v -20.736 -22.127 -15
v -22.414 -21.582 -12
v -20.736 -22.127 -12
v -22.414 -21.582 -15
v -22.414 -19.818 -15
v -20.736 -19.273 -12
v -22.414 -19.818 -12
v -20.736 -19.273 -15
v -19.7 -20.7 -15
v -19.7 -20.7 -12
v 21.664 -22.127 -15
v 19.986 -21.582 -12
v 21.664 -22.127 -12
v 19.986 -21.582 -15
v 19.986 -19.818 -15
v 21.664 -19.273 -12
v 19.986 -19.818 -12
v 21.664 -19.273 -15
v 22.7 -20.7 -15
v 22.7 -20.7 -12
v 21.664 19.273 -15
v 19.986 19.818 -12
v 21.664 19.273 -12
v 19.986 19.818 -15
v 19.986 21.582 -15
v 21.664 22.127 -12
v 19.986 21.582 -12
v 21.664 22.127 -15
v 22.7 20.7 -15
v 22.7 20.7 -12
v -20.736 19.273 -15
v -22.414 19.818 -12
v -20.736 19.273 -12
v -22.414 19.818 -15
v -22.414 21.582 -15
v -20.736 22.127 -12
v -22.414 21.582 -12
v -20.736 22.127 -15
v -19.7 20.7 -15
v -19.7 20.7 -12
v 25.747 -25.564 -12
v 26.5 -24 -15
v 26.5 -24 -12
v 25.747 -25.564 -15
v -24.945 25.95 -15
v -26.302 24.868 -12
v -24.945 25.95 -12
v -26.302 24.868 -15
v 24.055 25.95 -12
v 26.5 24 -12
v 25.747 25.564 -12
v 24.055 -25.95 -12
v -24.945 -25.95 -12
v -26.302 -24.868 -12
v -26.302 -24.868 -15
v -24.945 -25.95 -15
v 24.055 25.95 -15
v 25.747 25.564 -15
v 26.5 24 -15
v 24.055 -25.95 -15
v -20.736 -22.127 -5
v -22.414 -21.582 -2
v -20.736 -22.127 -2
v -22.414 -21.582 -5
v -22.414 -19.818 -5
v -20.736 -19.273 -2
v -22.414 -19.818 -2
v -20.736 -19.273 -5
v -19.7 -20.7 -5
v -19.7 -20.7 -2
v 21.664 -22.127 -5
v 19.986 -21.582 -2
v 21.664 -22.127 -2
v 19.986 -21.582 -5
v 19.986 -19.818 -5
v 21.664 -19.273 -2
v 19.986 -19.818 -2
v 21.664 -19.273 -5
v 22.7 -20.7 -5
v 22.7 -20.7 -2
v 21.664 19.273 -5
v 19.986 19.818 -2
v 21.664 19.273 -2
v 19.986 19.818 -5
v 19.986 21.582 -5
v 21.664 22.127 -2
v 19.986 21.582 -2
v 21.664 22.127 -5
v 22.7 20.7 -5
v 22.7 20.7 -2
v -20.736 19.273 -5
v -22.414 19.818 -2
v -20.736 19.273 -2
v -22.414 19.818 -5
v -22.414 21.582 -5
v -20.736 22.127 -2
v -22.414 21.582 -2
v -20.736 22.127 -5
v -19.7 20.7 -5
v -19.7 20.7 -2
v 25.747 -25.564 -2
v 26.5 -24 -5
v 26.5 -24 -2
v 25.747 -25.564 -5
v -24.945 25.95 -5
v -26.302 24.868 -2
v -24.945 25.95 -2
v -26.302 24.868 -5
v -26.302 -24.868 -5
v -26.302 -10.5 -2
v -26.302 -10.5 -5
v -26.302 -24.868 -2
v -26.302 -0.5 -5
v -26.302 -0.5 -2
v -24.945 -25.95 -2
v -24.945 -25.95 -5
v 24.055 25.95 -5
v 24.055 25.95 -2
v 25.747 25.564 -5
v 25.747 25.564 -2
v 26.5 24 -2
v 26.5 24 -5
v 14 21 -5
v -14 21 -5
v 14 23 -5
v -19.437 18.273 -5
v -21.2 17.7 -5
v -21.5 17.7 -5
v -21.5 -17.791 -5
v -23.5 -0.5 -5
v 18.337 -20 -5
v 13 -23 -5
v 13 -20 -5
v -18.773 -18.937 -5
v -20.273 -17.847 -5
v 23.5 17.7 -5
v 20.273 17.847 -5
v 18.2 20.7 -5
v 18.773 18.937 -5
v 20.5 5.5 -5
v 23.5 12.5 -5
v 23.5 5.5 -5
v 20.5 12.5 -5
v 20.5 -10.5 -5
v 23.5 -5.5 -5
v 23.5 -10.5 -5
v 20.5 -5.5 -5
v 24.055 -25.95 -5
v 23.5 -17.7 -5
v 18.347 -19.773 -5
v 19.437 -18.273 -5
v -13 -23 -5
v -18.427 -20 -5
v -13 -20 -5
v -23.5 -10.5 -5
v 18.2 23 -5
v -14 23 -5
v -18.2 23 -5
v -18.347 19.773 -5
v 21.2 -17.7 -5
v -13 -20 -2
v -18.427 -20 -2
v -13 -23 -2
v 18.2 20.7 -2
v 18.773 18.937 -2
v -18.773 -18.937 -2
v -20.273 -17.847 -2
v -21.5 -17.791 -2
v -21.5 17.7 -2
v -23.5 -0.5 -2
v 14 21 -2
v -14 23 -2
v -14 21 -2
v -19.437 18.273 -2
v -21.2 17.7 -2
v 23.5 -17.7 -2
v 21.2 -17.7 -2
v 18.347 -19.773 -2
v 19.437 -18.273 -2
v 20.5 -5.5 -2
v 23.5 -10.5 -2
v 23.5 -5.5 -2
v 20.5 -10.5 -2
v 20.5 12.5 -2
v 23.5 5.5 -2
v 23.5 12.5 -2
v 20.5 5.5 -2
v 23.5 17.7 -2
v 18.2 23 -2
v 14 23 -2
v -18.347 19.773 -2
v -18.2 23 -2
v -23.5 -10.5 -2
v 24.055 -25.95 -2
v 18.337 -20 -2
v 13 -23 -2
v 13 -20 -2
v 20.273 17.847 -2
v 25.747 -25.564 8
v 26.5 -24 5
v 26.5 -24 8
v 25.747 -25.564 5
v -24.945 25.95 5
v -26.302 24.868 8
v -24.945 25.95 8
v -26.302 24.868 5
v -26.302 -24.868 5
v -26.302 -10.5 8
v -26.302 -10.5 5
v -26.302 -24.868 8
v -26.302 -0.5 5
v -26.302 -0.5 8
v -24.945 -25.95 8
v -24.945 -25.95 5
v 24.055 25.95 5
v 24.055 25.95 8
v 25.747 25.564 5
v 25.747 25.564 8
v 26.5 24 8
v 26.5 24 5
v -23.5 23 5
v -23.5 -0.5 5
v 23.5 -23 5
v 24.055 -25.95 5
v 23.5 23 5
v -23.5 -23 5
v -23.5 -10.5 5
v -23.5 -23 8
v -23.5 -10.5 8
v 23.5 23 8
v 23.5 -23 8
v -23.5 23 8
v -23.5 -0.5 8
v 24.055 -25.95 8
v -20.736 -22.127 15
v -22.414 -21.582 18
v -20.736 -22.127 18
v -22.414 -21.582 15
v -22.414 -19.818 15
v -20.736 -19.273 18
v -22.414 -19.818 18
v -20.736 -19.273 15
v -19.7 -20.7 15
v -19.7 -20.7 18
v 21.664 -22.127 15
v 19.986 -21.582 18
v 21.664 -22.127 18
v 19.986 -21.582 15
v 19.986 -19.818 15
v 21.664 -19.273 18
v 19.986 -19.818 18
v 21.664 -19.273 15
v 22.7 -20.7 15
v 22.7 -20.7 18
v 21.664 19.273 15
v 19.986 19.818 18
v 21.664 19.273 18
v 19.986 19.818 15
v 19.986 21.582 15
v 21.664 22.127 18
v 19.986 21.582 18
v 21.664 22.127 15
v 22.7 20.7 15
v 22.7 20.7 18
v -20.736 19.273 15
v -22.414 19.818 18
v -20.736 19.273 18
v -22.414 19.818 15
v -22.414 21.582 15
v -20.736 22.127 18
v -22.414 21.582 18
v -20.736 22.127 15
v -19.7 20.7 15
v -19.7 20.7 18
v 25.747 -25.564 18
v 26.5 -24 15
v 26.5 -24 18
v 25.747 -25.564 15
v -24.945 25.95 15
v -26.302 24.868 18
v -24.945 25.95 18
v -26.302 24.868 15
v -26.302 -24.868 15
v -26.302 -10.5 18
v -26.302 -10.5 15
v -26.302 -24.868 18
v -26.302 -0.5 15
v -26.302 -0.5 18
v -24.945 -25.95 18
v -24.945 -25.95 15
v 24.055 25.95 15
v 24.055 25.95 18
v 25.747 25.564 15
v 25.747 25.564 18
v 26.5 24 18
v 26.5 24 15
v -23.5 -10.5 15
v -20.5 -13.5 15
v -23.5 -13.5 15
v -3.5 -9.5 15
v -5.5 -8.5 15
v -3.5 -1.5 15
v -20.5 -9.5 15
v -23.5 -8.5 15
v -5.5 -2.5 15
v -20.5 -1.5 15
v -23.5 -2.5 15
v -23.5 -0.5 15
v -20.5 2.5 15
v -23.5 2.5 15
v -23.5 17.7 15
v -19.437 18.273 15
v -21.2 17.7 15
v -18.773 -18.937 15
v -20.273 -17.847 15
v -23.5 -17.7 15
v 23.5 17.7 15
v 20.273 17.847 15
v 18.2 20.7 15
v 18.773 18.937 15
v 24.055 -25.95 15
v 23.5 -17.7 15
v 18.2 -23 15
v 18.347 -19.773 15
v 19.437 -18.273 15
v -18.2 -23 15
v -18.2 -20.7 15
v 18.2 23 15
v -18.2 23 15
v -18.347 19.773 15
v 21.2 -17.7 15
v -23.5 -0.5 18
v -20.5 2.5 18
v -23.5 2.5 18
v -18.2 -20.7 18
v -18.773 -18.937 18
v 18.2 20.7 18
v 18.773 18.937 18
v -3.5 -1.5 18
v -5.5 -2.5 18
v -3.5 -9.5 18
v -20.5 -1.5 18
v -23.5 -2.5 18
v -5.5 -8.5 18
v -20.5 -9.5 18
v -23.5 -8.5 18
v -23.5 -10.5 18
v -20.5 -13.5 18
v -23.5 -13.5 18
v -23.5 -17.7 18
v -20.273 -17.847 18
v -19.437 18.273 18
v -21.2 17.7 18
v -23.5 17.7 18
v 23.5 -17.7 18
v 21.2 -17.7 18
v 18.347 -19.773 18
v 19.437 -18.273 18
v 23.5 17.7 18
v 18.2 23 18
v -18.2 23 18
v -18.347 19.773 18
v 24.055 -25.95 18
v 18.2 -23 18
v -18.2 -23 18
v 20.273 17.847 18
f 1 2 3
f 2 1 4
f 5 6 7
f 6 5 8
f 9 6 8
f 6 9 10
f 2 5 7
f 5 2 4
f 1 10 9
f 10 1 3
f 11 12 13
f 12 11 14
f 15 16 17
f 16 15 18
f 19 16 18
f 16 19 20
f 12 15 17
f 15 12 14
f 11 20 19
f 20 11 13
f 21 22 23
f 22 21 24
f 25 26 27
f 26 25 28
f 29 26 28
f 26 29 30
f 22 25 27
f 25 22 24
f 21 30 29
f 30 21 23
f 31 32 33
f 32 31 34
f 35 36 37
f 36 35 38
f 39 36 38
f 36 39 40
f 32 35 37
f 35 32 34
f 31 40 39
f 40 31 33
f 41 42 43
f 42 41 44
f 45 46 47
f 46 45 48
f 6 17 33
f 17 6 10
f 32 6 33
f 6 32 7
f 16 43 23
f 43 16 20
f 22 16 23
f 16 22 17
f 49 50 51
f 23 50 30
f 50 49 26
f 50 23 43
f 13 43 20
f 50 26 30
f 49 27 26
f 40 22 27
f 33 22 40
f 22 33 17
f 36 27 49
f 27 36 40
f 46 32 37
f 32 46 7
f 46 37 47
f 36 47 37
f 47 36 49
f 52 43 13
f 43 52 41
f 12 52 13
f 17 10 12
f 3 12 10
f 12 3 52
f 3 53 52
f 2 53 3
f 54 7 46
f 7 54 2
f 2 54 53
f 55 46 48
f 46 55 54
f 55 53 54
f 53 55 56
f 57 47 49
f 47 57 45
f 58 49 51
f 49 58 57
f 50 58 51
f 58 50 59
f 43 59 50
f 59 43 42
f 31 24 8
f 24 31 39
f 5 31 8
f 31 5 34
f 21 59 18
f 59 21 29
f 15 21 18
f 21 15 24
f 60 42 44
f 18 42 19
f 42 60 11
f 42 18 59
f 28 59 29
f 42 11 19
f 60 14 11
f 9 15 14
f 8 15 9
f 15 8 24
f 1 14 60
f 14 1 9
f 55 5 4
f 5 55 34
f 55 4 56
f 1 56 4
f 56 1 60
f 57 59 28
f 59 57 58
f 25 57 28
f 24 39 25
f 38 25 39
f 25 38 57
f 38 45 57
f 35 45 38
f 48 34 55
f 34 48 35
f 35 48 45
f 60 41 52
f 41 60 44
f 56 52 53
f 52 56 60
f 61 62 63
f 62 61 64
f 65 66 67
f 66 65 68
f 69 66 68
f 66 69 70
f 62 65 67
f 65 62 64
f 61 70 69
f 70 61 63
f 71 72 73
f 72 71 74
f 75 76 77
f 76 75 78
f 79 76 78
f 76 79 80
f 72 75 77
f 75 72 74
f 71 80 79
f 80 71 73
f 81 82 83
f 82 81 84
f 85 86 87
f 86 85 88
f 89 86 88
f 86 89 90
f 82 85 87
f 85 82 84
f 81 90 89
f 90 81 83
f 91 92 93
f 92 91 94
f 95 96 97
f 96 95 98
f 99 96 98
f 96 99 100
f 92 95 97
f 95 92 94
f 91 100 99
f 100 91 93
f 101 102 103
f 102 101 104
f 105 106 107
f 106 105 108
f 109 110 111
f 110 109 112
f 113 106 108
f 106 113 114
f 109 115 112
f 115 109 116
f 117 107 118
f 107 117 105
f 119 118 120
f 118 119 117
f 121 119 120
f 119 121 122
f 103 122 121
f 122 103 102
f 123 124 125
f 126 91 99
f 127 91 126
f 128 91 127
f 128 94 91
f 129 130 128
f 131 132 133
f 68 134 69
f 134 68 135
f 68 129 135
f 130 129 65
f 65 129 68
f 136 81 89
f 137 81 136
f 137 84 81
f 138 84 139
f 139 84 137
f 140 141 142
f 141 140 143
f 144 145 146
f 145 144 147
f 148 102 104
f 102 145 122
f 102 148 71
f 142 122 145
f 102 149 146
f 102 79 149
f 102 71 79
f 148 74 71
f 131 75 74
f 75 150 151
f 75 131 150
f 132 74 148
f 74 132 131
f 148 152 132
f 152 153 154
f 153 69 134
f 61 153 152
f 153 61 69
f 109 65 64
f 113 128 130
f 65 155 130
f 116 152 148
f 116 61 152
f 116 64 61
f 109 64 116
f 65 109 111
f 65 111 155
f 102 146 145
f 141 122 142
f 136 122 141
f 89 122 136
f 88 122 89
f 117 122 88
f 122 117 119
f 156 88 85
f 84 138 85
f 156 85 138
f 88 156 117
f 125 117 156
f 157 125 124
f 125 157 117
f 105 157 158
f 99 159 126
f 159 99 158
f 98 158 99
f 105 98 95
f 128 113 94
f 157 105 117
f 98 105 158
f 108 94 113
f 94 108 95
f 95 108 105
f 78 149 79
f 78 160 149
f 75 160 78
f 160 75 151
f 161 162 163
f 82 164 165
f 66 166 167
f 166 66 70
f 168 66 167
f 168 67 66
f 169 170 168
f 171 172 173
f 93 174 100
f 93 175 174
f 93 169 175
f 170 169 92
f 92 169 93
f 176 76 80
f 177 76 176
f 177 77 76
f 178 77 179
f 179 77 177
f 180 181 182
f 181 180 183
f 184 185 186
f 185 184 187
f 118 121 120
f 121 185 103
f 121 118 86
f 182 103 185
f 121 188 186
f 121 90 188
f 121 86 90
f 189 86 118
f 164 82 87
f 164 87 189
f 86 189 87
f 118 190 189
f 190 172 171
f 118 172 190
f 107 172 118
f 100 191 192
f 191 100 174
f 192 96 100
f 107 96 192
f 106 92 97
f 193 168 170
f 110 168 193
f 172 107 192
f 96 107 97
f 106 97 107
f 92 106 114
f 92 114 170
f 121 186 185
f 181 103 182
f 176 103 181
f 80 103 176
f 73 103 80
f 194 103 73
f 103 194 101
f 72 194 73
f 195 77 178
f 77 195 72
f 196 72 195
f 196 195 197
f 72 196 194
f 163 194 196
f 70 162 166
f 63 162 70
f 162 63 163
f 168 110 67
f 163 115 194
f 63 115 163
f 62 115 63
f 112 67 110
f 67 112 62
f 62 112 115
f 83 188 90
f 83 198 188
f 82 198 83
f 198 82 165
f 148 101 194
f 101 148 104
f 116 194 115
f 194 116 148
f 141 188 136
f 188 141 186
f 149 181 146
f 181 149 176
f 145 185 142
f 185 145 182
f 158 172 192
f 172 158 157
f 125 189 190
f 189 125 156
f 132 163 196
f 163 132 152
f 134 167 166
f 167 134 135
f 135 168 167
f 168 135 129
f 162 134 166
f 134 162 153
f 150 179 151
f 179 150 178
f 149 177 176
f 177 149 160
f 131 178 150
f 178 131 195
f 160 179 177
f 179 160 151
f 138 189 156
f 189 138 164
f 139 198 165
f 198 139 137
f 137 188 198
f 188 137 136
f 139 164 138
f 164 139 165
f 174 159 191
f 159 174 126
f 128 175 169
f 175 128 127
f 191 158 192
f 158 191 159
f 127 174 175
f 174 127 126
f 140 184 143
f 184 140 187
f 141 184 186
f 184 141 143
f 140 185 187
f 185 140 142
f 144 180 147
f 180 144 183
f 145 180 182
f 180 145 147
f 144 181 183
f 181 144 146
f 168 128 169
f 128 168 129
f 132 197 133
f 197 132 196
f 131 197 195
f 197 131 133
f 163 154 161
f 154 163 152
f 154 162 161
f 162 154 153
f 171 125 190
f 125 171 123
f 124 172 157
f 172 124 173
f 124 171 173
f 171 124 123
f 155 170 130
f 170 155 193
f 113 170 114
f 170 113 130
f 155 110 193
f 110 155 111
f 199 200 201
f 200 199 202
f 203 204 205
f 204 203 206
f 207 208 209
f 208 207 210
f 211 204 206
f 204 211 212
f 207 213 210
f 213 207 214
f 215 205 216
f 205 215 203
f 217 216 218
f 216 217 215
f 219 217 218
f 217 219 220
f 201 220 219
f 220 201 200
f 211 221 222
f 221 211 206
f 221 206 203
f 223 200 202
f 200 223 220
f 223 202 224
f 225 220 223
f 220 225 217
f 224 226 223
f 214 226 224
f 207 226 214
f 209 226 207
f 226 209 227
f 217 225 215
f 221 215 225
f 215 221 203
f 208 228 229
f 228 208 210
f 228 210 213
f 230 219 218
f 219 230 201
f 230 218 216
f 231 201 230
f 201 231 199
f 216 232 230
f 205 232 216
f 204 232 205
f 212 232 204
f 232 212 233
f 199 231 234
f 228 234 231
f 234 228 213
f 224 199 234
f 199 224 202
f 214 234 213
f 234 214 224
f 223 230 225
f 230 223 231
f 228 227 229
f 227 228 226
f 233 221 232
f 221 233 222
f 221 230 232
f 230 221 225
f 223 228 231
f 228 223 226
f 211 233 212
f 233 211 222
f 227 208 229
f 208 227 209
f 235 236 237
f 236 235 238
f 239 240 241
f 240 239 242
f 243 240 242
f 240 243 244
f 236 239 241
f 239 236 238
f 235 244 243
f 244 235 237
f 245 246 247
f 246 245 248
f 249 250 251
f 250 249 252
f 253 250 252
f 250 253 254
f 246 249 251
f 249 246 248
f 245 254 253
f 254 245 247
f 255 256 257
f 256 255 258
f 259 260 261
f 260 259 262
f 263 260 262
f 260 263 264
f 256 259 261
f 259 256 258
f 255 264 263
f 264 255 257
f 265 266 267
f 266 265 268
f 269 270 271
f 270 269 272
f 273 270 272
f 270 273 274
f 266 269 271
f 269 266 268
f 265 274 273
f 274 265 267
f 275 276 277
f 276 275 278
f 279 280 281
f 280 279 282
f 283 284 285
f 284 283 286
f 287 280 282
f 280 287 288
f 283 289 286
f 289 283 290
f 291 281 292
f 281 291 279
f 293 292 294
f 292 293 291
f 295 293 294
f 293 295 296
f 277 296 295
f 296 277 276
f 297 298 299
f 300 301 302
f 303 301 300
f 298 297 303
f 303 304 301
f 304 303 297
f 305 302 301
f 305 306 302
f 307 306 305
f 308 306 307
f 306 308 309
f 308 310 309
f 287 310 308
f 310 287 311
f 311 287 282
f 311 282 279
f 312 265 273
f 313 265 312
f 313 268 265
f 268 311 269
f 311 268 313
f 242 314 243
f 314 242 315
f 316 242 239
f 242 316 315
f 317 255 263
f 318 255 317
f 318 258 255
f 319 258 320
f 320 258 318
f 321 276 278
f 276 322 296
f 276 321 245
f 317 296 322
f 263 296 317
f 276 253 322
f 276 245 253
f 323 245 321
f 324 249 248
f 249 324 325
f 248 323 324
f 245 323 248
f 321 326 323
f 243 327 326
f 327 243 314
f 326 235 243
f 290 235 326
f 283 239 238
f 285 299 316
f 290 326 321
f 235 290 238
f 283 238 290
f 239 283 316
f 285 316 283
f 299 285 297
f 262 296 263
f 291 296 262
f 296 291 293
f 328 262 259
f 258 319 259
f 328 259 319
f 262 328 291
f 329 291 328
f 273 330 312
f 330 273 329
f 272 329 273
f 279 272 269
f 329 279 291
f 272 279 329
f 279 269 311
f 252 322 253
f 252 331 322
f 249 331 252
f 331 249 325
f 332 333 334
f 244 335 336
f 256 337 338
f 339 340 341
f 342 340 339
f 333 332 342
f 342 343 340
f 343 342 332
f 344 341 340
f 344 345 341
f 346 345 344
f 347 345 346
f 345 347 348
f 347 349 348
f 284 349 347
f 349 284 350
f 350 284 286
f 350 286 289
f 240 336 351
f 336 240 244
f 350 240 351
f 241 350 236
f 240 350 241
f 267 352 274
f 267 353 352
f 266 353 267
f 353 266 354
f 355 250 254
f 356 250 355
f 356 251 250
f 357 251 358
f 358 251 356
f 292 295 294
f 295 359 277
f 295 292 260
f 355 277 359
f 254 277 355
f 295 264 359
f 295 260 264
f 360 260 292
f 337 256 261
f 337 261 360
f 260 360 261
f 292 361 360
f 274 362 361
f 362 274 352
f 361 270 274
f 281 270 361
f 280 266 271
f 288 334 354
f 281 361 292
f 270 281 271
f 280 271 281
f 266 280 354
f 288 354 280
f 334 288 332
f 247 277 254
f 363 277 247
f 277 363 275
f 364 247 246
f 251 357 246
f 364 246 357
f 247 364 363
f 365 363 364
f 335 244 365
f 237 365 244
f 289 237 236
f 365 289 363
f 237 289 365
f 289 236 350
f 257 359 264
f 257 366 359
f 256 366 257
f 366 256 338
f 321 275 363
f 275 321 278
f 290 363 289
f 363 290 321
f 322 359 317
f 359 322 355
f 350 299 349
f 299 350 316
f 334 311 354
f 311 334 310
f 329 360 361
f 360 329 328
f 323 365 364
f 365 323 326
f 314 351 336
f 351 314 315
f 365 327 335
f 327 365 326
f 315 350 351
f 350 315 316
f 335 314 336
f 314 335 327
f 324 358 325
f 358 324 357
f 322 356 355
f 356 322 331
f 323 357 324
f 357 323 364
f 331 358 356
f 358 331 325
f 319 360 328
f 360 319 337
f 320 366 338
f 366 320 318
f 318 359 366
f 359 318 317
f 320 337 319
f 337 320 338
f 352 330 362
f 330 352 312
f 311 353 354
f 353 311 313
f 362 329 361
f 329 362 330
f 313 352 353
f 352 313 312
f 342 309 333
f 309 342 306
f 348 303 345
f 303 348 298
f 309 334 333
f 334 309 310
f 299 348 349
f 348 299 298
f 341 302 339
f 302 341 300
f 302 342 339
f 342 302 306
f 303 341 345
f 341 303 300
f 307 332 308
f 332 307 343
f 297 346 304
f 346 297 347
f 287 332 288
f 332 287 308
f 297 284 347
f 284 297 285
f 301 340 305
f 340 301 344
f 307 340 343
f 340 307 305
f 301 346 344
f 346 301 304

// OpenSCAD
// file: settings.scad
/*
The OpenTRV project licenses this file to you
under the Apache Licence, Version 2.0 (the "Licence");
you may not use this file except in compliance
with the Licence. You may obtain a copy of the Licence at

http://www.apache.org/licenses/LICENSE-2.0

Unless required by applicable law or agreed to in writing,
software distributed under the Licence is distributed on an
"AS IS" BASIS, WITHOUT WARRANTIES OR CONDITIONS OF ANY
KIND, either express or implied. See the Licence for the
specific language governing permissions and limitations
under the Licence.

Author(s) / Copyright (s): Bruno Girin 2013
*/

/* General constants */
TOP    = 0;
RIGHT  = 1;
BOTTOM = 2;
LEFT   = 3;

/*
PCB board measurements

All measurements and placements are taken such that the version number (V0.09)
is facing the right way up.
*/
/* The basic measurements of the PCB */
pcb_width = 47;
pcb_length = 46;
pcb_thickness = 1.7;
/* There are four mounting holes in each corner of the PCB */
pcb_mounting_hole_radius = 1.5; /* Fits an M3 bolt */
pcb_mounting_hole_to_edge = 0.8;
pcb_mounting_hole_max_padding = 1.5;

/* Settings for the box itself */
box_wall_width = 3;
box_layer_thickness = 3;
box_corner_radius = 2;

/*
Valve attachment measurements

All measurements below are used by the test valve connector.
*/

// Screw attributes. At the moment, the only supported combination is:
// diameter: 30, pitch:1.5
screw_diameter=30;
screw_pitch=1.5;
// The screw tolerance allows the screw connector to be scale slightly in order
// to give a bit of tolerance to how snuggly the screw fits the valve
screw_tolerance=0.01;
screw_height=10;
screw_thickness=2;
screw_protusion_number=12;

// Connector attributes
connector_height=15;
connector_slit_number=8; // this has to be an even number (for the moment)
connector_slit_thickness=2;
connector_slit_offset=3;
connector_plate_thickness=1;
// main file
/*
The OpenTRV project licenses this file to you
under the Apache Licence, Version 2.0 (the "Licence");
you may not use this file except in compliance
with the Licence. You may obtain a copy of the Licence at

http://www.apache.org/licenses/LICENSE-2.0

Unless required by applicable law or agreed to in writing,
software distributed under the Licence is distributed on an
"AS IS" BASIS, WITHOUT WARRANTIES OR CONDITIONS OF ANY
KIND, either express or implied. See the Licence for the
specific language governing permissions and limitations
under the Licence.

Author(s) / Copyright (s): Bruno Girin 2013
*/

include <settings.scad>;

box_total_width = pcb_width + 2 * box_wall_width;
box_cube_width = box_total_width - 2 * box_corner_radius;
box_total_length = pcb_length + 2 * box_wall_width;
box_cube_length = box_total_length - 2 * box_corner_radius;
mounting_hole_pcb_offset = pcb_mounting_hole_to_edge + pcb_mounting_hole_radius;
mounting_hole_box_offset = box_wall_width + mounting_hole_pcb_offset;

module box_mounting_hole() {
    translate([0, 0, -0.1])
    cylinder(r = pcb_mounting_hole_radius, h = box_layer_thickness + 0.2);
}

module box_mounting_holes() {
    union() {
        translate([
            -pcb_width / 2 + mounting_hole_pcb_offset,
            -pcb_length / 2 + mounting_hole_pcb_offset,
            0])
        box_mounting_hole();
        translate([
            +pcb_width / 2 - mounting_hole_pcb_offset,
            -pcb_length / 2 + mounting_hole_pcb_offset,
            0])
        box_mounting_hole();
        translate([
            +pcb_width / 2 - mounting_hole_pcb_offset,
            +pcb_length / 2 - mounting_hole_pcb_offset,
            0])
        box_mounting_hole();
        translate([
            -pcb_width / 2 + mounting_hole_pcb_offset,
            +pcb_length / 2 - mounting_hole_pcb_offset,
            0])
        box_mounting_hole();
    }
}

module box_mounting_hole_surround() {
    hull_cube_side = box_layer_thickness - box_corner_radius;
    surround_radius = pcb_mounting_hole_radius + pcb_mounting_hole_max_padding;
    hull() {
        cylinder(r = surround_radius,
            h = box_layer_thickness);
        translate([mounting_hole_pcb_offset, -surround_radius, 0])
            cube(size = [hull_cube_side, hull_cube_side, box_layer_thickness]);
        translate([-surround_radius, mounting_hole_pcb_offset, 0])
            cube(size = [hull_cube_side, hull_cube_side, box_layer_thickness]);
        translate([mounting_hole_pcb_offset, mounting_hole_pcb_offset, 0])
            cube(size = [hull_cube_side, hull_cube_side, box_layer_thickness]);
    }
}

module box_mounting_hole_surrounds() {
    union() {
        translate([
            -pcb_width / 2 + mounting_hole_pcb_offset,
            -pcb_length / 2 + mounting_hole_pcb_offset,
            0])
        rotate(a = 180, v = [0, 0, 1])
        box_mounting_hole_surround();
        translate([
            +pcb_width / 2 - mounting_hole_pcb_offset,
            -pcb_length / 2 + mounting_hole_pcb_offset,
            0])
        rotate(a = -90, v = [0, 0, 1])
        box_mounting_hole_surround();
        translate([
            +pcb_width / 2 - mounting_hole_pcb_offset,
            +pcb_length / 2 - mounting_hole_pcb_offset,
            0])
        box_mounting_hole_surround();
        translate([
            -pcb_width / 2 + mounting_hole_pcb_offset,
            +pcb_length / 2 - mounting_hole_pcb_offset,
            0])
        rotate(a = 90, v = [0, 0, 1])
        box_mounting_hole_surround();
    }
}

module box_base() {
    hull() {
        translate([-box_cube_width / 2, -box_cube_length / 2, 0])
        cylinder(r = box_corner_radius, h = box_layer_thickness);
        translate([+box_cube_width / 2, -box_cube_length / 2, 0])
        cylinder(r = box_corner_radius, h = box_layer_thickness);
        translate([+box_cube_width / 2, +box_cube_length / 2, 0])
        cylinder(r = box_corner_radius, h = box_layer_thickness);
        translate([-box_cube_width / 2, +box_cube_length / 2, 0])
        cylinder(r = box_corner_radius, h = box_layer_thickness);
    }
}

module pcb_hole() {
    translate([-pcb_width / 2, -pcb_length / 2, -0.1])
    cube(size = [pcb_width, pcb_length, box_layer_thickness + 0.2]);
}

module box_inside_tab(side, width, depth, offset) {
    if(side == TOP) {
        translate([offset - width / 2, pcb_length / 2 - depth, 0])
        cube(size = [width, depth, box_layer_thickness]);
    }
    if(side == BOTTOM) {
        translate([offset - width / 2, -pcb_length / 2 - 0.1, 0])
        cube(size = [width, depth + 0.1, box_layer_thickness]);
    }
    if(side == LEFT) {
        translate([-pcb_width / 2 - 0.1, offset - width / 2, 0])
        cube(size = [depth + 0.1, width, box_layer_thickness]);
    }
    if(side == RIGHT) {
        translate([pcb_width / 2 - depth, offset - width / 2, 0])
        cube(size = [depth + 0.1, width, box_layer_thickness]);
    }
}

module box_outside_hole(side, width, depth, offset) {
    if(side == TOP) {
        translate([offset - width / 2, box_total_length / 2 - depth, -0.1])
        cube(size = [width, depth, box_layer_thickness + 0.2]);
    }
    if(side == BOTTOM) {
        translate([offset - width / 2, -box_total_length / 2 - 0.1, -0.1])
        cube(size = [width, depth + 0.1, box_layer_thickness + 0.2]);
    }
    if(side == LEFT) {
        translate([-box_total_width / 2 - 0.1, offset - width / 2, -0.1])
        cube(size = [depth + 0.1, width, box_layer_thickness + 0.2]);
    }
    if(side == RIGHT) {
        translate([box_total_width / 2 - depth, offset - width / 2, -0.1])
        cube(size = [depth + 0.1, width, box_layer_thickness + 0.2]);
    }
}

module box_spacer_layer() {
    difference() {
        union() {
            difference() {
                box_base();
                pcb_hole();
            }
            box_mounting_hole_surrounds();
        }
        box_mounting_holes();
    }
}

module box_layer0() {
    difference() {
        box_base();
        box_mounting_holes();
    }
}

module box_layer1() {
    difference() {
        union() {
            box_spacer_layer();
            box_inside_tab(RIGHT, 7, 3, 9);
            box_inside_tab(RIGHT, 5, 3, -8);
            box_inside_tab(LEFT, 36, 2, 0);
            box_inside_tab(BOTTOM, 6, 3, 16);
            box_inside_tab(BOTTOM, 6, 3, -16);
            box_inside_tab(TOP, 28, 2, 0);
        }
        box_outside_hole(LEFT, 10, box_layer_thickness, -5.5);
    }
}

module box_layer2() {
    difference() {
        box_base();
        pcb_hole();
        box_outside_hole(LEFT, 10, box_layer_thickness + 0.1, -5.5);
    }
}

module box_layer3() {
    difference() {
        union() {
            box_spacer_layer();
            box_inside_tab(LEFT, 10 + 2 * box_layer_thickness, box_layer_thickness, -5.5);
            box_inside_tab(LEFT, 8, 20, -5.5);
        }
        box_outside_hole(LEFT, 10, box_layer_thickness, -5.5);
        box_outside_hole(LEFT, 6, box_layer_thickness + 18, -5.5);
    }
}


translate([0, 0, -15])
box_layer0();

translate([0, 0, -5])
box_layer1();

translate([0, 0, 5])
box_layer2();

translate([0, 0, 15])
box_layer3();
